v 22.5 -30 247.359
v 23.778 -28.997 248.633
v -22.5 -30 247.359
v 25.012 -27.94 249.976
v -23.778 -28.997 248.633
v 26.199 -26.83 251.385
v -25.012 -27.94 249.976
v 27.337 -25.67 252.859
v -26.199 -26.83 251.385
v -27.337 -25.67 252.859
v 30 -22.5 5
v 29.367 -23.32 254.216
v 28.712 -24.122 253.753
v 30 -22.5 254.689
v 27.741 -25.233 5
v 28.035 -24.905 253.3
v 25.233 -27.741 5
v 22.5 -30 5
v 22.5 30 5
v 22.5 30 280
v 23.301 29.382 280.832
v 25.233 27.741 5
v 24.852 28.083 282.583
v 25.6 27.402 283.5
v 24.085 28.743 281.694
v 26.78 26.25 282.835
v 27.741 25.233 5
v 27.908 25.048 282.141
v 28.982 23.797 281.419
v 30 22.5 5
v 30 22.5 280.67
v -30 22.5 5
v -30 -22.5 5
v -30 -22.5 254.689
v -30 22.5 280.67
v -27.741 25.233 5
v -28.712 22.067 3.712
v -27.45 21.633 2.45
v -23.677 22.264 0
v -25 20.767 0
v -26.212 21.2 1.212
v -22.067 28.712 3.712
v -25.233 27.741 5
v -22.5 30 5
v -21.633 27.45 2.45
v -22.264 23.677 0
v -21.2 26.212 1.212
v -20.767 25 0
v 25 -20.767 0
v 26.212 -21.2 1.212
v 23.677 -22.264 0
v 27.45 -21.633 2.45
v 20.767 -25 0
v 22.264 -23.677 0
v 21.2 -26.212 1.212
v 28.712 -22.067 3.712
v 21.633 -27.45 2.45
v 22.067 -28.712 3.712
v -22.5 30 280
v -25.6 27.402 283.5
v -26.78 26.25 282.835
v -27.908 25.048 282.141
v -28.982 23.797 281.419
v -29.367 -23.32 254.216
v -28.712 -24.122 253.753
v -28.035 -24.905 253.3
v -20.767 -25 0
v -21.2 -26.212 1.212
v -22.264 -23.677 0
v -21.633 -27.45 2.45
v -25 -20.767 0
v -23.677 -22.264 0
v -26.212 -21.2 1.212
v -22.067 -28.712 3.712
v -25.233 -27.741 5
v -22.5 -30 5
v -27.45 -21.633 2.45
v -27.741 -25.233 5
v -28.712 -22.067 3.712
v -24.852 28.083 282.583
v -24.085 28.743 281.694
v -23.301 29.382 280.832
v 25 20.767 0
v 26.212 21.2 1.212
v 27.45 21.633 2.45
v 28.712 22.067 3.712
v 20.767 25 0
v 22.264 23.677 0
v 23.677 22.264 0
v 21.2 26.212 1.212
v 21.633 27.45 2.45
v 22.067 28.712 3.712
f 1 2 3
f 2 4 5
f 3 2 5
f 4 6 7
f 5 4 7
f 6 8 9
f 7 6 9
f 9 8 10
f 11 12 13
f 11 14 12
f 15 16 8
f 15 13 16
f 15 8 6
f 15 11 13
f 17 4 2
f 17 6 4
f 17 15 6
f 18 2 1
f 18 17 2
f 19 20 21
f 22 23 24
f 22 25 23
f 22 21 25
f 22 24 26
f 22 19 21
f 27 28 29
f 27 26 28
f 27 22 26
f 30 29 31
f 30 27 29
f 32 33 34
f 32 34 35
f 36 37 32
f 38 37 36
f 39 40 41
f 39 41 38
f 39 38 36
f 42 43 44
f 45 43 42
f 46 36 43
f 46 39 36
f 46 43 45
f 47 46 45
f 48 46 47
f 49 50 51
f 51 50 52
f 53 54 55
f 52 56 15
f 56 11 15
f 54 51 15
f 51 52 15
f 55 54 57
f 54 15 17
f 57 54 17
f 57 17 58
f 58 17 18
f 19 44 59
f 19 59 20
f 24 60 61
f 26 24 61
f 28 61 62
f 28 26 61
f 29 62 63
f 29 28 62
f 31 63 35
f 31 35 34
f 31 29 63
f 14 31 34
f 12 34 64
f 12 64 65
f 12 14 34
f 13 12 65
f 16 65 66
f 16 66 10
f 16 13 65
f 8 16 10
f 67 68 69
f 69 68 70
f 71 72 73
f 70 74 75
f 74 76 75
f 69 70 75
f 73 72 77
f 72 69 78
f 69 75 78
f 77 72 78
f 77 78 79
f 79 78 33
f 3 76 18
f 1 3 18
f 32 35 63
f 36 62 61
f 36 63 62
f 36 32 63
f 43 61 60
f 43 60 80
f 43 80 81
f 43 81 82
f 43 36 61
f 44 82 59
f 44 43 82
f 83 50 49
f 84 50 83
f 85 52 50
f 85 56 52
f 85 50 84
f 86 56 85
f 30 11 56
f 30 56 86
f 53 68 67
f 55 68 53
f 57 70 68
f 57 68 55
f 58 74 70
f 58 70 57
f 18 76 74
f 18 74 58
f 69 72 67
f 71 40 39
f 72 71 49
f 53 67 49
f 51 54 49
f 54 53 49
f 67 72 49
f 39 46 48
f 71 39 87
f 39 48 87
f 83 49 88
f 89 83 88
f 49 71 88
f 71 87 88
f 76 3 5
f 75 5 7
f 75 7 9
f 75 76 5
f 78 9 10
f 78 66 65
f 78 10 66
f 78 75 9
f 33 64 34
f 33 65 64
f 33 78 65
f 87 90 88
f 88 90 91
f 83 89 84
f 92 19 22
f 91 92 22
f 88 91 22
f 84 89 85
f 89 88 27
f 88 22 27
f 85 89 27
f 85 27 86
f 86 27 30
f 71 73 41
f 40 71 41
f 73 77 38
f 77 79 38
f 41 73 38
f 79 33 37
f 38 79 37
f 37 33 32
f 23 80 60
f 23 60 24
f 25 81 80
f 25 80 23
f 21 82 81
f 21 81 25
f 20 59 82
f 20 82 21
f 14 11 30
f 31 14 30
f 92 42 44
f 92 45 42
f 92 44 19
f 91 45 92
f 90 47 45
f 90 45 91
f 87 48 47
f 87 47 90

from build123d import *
from OCP.BRepFilletAPI import BRepFilletAPI_MakeChamfer

# Parameters (mm, degrees)
SKETCH_1_W          = 60
SKETCH_1_H          = 60
EXTRUDE_1_DEPTH     = 285
CUT_EXTRUDE_1_DEPTH = 95
SKETCH_3_OUTSIDE_W  = 121.472
SKETCH_3_OUTSIDE_H  = 121.472
SKETCH_3_OUTSIDE_R  = 37.5
CUT_EXTRUDE_2_DEPTH = 289.140590684
CHAMFER_1_SIZE      = 3
CHAMFER_1_SIZE2     = 5
CHAMFER_2_SIZE      = 5


with BuildPart() as part:
    # 草图1 → 凸台-拉伸1 (new body)
    with BuildSketch(Plane.XY):
        Rectangle(SKETCH_1_W, SKETCH_1_H)
    extrude(amount=EXTRUDE_1_DEPTH)

    # 草图2 → 切除-拉伸1 (cut)
    with BuildSketch(Plane(origin=(30, 0, 0), x_dir=(0, 0, -1), z_dir=(1, 0, 0))):
        Polygon((-285, 30), (-250.358983849, -30), (-285, -30), align=None)
    extrude(amount=-CUT_EXTRUDE_1_DEPTH, mode=Mode.SUBTRACT)

    # 草图3 outside → 切除-拉伸2 (cut, through all)
    with BuildSketch(Plane(origin=(0, 0, 0), x_dir=(1, 0, 0), z_dir=(0, 0, -1))):
        Rectangle(SKETCH_3_OUTSIDE_W, SKETCH_3_OUTSIDE_H)
        Circle(SKETCH_3_OUTSIDE_R, mode=Mode.SUBTRACT)
    extrude(amount=-CUT_EXTRUDE_2_DEPTH, mode=Mode.SUBTRACT)

    # 倒角1: one chamfer whose edges measure the first distance from different faces: ONE call of the kernel's chamfer builder (chamfer() names one face for all edges)
    chamfer_1_edges_1 = [part.edges().sort_by_distance(p)[0] for p in [
        (0, -30, 250.358983849),
    ]]
    chamfer_1_side_1 = [part.faces().sort_by_distance(p)[0] for p in [
        (0, -30, 125.179491924),
    ]]
    chamfer_1_edges_2 = [part.edges().sort_by_distance(p)[0] for p in [
        (0, 30, 285),
    ]]
    chamfer_1_side_2 = [part.faces().sort_by_distance(p)[0] for p in [
        (0, 0, 267.679491924),
    ]]
    chamfer_1 = BRepFilletAPI_MakeChamfer(part.part.solid().wrapped)
    for e in chamfer_1_edges_1:
        chamfer_1.Add(CHAMFER_1_SIZE, CHAMFER_1_SIZE2, e.wrapped, chamfer_1_side_1[0].wrapped)  # the first distance lies on this face
    for e in chamfer_1_edges_2:
        chamfer_1.Add(CHAMFER_1_SIZE, CHAMFER_1_SIZE2, e.wrapped, chamfer_1_side_2[0].wrapped)  # the first distance lies on this face
    add(Compound.cast(chamfer_1.Shape()), mode=Mode.REPLACE)

    # 倒角2
    chamfer_2_edges = [part.edges().sort_by_distance(p)[0] for p in [
        (-30, 0, 0),
        (0, 30, 0),
        (30, 0, 0),
        (0, -30, 0),
        (26.516504294, -26.516504294, 0),
        (-26.516504294, 26.516504294, 0),
        (-26.516504294, -26.516504294, 0),
        (26.516504294, 26.516504294, 0),
    ]]
    chamfer(chamfer_2_edges, length=CHAMFER_2_SIZE)


solid = part.part
